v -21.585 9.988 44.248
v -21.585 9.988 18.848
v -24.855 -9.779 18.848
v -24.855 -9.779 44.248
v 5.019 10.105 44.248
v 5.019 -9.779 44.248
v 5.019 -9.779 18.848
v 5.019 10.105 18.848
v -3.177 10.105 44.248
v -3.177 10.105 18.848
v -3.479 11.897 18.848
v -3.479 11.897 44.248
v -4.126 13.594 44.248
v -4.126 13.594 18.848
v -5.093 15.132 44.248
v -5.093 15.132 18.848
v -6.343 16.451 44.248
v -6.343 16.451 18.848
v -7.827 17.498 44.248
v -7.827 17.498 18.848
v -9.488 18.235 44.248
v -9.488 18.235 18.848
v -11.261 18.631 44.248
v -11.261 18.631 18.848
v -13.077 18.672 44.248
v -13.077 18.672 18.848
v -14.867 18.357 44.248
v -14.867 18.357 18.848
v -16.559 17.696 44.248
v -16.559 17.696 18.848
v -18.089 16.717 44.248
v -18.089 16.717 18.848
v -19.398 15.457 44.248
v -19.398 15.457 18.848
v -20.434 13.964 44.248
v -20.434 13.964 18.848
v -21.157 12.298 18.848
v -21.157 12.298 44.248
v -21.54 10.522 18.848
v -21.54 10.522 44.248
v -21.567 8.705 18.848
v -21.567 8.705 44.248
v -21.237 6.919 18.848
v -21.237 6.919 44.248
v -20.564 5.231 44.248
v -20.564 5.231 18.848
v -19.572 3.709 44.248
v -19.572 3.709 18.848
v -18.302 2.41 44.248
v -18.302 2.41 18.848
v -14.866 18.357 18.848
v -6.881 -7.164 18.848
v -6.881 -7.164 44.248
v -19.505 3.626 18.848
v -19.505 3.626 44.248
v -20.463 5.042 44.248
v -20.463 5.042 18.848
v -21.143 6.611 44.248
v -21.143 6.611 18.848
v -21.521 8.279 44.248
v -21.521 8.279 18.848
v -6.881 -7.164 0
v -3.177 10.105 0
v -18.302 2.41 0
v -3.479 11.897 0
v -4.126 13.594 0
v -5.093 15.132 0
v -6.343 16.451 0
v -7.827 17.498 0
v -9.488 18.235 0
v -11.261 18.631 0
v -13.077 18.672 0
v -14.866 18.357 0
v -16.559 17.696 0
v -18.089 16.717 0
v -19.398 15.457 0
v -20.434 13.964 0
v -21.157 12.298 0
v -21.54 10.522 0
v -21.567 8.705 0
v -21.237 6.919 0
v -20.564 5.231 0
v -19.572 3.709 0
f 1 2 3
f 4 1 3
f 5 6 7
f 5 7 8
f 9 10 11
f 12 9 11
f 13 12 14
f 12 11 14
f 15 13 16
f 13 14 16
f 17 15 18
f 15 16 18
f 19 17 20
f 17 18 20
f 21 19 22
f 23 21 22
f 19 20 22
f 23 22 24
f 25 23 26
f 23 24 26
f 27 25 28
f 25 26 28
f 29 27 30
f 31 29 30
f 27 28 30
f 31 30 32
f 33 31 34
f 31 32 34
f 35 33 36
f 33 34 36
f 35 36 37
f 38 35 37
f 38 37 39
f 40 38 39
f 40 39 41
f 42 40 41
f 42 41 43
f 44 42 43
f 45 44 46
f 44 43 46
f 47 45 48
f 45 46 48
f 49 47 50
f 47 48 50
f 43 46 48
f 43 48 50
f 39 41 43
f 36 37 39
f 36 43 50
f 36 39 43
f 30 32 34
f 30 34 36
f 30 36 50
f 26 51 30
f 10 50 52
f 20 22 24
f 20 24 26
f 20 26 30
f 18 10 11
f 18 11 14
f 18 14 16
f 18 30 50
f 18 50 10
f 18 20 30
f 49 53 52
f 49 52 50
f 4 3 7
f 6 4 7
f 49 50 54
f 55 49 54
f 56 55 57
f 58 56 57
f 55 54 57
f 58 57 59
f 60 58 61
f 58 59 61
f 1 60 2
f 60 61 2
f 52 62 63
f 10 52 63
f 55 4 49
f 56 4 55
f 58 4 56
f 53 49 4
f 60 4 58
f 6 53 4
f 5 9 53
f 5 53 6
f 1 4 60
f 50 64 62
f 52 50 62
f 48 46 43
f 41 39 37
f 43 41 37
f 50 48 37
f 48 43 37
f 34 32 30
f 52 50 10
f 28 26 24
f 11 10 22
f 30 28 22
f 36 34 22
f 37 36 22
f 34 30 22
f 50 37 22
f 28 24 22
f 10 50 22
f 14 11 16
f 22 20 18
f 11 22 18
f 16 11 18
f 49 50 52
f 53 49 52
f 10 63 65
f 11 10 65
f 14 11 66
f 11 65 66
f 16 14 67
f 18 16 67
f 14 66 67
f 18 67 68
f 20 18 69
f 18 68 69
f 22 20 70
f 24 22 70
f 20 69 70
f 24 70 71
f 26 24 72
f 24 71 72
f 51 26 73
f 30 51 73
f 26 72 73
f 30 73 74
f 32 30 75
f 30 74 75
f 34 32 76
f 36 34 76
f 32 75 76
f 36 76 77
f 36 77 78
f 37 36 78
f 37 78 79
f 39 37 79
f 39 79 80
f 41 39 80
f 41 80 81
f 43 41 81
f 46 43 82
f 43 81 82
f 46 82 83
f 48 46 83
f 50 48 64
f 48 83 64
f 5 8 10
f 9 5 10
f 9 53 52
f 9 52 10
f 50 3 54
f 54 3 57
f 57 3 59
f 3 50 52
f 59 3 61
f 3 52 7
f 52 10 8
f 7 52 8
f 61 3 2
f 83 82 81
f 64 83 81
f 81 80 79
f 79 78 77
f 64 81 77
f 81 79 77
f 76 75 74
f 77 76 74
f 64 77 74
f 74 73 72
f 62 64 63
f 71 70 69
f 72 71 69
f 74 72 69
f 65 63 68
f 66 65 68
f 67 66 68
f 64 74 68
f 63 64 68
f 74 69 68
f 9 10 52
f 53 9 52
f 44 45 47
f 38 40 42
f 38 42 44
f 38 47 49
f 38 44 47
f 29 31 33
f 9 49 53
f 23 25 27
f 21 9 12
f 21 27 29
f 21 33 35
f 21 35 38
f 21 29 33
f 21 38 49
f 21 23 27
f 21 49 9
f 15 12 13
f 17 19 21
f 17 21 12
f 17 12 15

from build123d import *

# Parameters (mm, degrees)
F1_DEPTH = 18.848188
F3_DEPTH = 25.4
F4_DEPTH = 25.4


with BuildPart() as f1:
    # F0 (on Top) → F1 (new body)
    with BuildSketch(Plane.XY):
        with BuildLine():
            Line((-6.880872, -7.164007), (-3.177042, 10.105129))
            ThreePointArc((-3.177042, 10.105129), (-16.559032, 17.696466), (-18.301774, 2.410234))
            Line((-18.301774, 2.410234), (-6.880872, -7.164007))
        make_face()
    extrude(amount=F1_DEPTH)


with BuildPart() as f3:
    # F2 (on face) → F3 (new body)
    with BuildSketch(Plane.XY.offset(18.848188)):
        with BuildLine():
            Line((5.018667, 10.105129), (-3.177042, 10.105129))
            Line((-3.177042, 10.105129), (-6.880872, -7.164007))
            Line((-6.880872, -7.164007), (-18.301774, 2.410234))
            ThreePointArc((-18.301774, 2.410234), (-20.839034, 5.81093), (-21.585046, 9.987758))
            Line((-21.585046, 9.987758), (-24.854667, -9.778981))
            Line((-24.854667, -9.778981), (5.018667, -9.778981))
            Line((5.018667, -9.778981), (5.018667, 10.105129))
        make_face()
    extrude(amount=F3_DEPTH)


with BuildPart() as f4:
    # F1_face (on face) → F4 (new body)
    with BuildSketch(Plane(origin=(-11.883277, 7.786879, 18.848188), x_dir=(1, 0, 0), z_dir=(0, 0, 1))):
        with BuildLine():
            Line((-6.418497, -5.376645), (5.002405, -14.950885))
            Line((5.002405, -14.950885), (8.706235, 2.318251))
            ThreePointArc((8.706235, 2.318251), (-4.675755, 9.909588), (-6.418497, -5.376645))
        make_face()
    extrude(amount=F4_DEPTH)


solid = Compound([f1.part, f3.part, f4.part])
